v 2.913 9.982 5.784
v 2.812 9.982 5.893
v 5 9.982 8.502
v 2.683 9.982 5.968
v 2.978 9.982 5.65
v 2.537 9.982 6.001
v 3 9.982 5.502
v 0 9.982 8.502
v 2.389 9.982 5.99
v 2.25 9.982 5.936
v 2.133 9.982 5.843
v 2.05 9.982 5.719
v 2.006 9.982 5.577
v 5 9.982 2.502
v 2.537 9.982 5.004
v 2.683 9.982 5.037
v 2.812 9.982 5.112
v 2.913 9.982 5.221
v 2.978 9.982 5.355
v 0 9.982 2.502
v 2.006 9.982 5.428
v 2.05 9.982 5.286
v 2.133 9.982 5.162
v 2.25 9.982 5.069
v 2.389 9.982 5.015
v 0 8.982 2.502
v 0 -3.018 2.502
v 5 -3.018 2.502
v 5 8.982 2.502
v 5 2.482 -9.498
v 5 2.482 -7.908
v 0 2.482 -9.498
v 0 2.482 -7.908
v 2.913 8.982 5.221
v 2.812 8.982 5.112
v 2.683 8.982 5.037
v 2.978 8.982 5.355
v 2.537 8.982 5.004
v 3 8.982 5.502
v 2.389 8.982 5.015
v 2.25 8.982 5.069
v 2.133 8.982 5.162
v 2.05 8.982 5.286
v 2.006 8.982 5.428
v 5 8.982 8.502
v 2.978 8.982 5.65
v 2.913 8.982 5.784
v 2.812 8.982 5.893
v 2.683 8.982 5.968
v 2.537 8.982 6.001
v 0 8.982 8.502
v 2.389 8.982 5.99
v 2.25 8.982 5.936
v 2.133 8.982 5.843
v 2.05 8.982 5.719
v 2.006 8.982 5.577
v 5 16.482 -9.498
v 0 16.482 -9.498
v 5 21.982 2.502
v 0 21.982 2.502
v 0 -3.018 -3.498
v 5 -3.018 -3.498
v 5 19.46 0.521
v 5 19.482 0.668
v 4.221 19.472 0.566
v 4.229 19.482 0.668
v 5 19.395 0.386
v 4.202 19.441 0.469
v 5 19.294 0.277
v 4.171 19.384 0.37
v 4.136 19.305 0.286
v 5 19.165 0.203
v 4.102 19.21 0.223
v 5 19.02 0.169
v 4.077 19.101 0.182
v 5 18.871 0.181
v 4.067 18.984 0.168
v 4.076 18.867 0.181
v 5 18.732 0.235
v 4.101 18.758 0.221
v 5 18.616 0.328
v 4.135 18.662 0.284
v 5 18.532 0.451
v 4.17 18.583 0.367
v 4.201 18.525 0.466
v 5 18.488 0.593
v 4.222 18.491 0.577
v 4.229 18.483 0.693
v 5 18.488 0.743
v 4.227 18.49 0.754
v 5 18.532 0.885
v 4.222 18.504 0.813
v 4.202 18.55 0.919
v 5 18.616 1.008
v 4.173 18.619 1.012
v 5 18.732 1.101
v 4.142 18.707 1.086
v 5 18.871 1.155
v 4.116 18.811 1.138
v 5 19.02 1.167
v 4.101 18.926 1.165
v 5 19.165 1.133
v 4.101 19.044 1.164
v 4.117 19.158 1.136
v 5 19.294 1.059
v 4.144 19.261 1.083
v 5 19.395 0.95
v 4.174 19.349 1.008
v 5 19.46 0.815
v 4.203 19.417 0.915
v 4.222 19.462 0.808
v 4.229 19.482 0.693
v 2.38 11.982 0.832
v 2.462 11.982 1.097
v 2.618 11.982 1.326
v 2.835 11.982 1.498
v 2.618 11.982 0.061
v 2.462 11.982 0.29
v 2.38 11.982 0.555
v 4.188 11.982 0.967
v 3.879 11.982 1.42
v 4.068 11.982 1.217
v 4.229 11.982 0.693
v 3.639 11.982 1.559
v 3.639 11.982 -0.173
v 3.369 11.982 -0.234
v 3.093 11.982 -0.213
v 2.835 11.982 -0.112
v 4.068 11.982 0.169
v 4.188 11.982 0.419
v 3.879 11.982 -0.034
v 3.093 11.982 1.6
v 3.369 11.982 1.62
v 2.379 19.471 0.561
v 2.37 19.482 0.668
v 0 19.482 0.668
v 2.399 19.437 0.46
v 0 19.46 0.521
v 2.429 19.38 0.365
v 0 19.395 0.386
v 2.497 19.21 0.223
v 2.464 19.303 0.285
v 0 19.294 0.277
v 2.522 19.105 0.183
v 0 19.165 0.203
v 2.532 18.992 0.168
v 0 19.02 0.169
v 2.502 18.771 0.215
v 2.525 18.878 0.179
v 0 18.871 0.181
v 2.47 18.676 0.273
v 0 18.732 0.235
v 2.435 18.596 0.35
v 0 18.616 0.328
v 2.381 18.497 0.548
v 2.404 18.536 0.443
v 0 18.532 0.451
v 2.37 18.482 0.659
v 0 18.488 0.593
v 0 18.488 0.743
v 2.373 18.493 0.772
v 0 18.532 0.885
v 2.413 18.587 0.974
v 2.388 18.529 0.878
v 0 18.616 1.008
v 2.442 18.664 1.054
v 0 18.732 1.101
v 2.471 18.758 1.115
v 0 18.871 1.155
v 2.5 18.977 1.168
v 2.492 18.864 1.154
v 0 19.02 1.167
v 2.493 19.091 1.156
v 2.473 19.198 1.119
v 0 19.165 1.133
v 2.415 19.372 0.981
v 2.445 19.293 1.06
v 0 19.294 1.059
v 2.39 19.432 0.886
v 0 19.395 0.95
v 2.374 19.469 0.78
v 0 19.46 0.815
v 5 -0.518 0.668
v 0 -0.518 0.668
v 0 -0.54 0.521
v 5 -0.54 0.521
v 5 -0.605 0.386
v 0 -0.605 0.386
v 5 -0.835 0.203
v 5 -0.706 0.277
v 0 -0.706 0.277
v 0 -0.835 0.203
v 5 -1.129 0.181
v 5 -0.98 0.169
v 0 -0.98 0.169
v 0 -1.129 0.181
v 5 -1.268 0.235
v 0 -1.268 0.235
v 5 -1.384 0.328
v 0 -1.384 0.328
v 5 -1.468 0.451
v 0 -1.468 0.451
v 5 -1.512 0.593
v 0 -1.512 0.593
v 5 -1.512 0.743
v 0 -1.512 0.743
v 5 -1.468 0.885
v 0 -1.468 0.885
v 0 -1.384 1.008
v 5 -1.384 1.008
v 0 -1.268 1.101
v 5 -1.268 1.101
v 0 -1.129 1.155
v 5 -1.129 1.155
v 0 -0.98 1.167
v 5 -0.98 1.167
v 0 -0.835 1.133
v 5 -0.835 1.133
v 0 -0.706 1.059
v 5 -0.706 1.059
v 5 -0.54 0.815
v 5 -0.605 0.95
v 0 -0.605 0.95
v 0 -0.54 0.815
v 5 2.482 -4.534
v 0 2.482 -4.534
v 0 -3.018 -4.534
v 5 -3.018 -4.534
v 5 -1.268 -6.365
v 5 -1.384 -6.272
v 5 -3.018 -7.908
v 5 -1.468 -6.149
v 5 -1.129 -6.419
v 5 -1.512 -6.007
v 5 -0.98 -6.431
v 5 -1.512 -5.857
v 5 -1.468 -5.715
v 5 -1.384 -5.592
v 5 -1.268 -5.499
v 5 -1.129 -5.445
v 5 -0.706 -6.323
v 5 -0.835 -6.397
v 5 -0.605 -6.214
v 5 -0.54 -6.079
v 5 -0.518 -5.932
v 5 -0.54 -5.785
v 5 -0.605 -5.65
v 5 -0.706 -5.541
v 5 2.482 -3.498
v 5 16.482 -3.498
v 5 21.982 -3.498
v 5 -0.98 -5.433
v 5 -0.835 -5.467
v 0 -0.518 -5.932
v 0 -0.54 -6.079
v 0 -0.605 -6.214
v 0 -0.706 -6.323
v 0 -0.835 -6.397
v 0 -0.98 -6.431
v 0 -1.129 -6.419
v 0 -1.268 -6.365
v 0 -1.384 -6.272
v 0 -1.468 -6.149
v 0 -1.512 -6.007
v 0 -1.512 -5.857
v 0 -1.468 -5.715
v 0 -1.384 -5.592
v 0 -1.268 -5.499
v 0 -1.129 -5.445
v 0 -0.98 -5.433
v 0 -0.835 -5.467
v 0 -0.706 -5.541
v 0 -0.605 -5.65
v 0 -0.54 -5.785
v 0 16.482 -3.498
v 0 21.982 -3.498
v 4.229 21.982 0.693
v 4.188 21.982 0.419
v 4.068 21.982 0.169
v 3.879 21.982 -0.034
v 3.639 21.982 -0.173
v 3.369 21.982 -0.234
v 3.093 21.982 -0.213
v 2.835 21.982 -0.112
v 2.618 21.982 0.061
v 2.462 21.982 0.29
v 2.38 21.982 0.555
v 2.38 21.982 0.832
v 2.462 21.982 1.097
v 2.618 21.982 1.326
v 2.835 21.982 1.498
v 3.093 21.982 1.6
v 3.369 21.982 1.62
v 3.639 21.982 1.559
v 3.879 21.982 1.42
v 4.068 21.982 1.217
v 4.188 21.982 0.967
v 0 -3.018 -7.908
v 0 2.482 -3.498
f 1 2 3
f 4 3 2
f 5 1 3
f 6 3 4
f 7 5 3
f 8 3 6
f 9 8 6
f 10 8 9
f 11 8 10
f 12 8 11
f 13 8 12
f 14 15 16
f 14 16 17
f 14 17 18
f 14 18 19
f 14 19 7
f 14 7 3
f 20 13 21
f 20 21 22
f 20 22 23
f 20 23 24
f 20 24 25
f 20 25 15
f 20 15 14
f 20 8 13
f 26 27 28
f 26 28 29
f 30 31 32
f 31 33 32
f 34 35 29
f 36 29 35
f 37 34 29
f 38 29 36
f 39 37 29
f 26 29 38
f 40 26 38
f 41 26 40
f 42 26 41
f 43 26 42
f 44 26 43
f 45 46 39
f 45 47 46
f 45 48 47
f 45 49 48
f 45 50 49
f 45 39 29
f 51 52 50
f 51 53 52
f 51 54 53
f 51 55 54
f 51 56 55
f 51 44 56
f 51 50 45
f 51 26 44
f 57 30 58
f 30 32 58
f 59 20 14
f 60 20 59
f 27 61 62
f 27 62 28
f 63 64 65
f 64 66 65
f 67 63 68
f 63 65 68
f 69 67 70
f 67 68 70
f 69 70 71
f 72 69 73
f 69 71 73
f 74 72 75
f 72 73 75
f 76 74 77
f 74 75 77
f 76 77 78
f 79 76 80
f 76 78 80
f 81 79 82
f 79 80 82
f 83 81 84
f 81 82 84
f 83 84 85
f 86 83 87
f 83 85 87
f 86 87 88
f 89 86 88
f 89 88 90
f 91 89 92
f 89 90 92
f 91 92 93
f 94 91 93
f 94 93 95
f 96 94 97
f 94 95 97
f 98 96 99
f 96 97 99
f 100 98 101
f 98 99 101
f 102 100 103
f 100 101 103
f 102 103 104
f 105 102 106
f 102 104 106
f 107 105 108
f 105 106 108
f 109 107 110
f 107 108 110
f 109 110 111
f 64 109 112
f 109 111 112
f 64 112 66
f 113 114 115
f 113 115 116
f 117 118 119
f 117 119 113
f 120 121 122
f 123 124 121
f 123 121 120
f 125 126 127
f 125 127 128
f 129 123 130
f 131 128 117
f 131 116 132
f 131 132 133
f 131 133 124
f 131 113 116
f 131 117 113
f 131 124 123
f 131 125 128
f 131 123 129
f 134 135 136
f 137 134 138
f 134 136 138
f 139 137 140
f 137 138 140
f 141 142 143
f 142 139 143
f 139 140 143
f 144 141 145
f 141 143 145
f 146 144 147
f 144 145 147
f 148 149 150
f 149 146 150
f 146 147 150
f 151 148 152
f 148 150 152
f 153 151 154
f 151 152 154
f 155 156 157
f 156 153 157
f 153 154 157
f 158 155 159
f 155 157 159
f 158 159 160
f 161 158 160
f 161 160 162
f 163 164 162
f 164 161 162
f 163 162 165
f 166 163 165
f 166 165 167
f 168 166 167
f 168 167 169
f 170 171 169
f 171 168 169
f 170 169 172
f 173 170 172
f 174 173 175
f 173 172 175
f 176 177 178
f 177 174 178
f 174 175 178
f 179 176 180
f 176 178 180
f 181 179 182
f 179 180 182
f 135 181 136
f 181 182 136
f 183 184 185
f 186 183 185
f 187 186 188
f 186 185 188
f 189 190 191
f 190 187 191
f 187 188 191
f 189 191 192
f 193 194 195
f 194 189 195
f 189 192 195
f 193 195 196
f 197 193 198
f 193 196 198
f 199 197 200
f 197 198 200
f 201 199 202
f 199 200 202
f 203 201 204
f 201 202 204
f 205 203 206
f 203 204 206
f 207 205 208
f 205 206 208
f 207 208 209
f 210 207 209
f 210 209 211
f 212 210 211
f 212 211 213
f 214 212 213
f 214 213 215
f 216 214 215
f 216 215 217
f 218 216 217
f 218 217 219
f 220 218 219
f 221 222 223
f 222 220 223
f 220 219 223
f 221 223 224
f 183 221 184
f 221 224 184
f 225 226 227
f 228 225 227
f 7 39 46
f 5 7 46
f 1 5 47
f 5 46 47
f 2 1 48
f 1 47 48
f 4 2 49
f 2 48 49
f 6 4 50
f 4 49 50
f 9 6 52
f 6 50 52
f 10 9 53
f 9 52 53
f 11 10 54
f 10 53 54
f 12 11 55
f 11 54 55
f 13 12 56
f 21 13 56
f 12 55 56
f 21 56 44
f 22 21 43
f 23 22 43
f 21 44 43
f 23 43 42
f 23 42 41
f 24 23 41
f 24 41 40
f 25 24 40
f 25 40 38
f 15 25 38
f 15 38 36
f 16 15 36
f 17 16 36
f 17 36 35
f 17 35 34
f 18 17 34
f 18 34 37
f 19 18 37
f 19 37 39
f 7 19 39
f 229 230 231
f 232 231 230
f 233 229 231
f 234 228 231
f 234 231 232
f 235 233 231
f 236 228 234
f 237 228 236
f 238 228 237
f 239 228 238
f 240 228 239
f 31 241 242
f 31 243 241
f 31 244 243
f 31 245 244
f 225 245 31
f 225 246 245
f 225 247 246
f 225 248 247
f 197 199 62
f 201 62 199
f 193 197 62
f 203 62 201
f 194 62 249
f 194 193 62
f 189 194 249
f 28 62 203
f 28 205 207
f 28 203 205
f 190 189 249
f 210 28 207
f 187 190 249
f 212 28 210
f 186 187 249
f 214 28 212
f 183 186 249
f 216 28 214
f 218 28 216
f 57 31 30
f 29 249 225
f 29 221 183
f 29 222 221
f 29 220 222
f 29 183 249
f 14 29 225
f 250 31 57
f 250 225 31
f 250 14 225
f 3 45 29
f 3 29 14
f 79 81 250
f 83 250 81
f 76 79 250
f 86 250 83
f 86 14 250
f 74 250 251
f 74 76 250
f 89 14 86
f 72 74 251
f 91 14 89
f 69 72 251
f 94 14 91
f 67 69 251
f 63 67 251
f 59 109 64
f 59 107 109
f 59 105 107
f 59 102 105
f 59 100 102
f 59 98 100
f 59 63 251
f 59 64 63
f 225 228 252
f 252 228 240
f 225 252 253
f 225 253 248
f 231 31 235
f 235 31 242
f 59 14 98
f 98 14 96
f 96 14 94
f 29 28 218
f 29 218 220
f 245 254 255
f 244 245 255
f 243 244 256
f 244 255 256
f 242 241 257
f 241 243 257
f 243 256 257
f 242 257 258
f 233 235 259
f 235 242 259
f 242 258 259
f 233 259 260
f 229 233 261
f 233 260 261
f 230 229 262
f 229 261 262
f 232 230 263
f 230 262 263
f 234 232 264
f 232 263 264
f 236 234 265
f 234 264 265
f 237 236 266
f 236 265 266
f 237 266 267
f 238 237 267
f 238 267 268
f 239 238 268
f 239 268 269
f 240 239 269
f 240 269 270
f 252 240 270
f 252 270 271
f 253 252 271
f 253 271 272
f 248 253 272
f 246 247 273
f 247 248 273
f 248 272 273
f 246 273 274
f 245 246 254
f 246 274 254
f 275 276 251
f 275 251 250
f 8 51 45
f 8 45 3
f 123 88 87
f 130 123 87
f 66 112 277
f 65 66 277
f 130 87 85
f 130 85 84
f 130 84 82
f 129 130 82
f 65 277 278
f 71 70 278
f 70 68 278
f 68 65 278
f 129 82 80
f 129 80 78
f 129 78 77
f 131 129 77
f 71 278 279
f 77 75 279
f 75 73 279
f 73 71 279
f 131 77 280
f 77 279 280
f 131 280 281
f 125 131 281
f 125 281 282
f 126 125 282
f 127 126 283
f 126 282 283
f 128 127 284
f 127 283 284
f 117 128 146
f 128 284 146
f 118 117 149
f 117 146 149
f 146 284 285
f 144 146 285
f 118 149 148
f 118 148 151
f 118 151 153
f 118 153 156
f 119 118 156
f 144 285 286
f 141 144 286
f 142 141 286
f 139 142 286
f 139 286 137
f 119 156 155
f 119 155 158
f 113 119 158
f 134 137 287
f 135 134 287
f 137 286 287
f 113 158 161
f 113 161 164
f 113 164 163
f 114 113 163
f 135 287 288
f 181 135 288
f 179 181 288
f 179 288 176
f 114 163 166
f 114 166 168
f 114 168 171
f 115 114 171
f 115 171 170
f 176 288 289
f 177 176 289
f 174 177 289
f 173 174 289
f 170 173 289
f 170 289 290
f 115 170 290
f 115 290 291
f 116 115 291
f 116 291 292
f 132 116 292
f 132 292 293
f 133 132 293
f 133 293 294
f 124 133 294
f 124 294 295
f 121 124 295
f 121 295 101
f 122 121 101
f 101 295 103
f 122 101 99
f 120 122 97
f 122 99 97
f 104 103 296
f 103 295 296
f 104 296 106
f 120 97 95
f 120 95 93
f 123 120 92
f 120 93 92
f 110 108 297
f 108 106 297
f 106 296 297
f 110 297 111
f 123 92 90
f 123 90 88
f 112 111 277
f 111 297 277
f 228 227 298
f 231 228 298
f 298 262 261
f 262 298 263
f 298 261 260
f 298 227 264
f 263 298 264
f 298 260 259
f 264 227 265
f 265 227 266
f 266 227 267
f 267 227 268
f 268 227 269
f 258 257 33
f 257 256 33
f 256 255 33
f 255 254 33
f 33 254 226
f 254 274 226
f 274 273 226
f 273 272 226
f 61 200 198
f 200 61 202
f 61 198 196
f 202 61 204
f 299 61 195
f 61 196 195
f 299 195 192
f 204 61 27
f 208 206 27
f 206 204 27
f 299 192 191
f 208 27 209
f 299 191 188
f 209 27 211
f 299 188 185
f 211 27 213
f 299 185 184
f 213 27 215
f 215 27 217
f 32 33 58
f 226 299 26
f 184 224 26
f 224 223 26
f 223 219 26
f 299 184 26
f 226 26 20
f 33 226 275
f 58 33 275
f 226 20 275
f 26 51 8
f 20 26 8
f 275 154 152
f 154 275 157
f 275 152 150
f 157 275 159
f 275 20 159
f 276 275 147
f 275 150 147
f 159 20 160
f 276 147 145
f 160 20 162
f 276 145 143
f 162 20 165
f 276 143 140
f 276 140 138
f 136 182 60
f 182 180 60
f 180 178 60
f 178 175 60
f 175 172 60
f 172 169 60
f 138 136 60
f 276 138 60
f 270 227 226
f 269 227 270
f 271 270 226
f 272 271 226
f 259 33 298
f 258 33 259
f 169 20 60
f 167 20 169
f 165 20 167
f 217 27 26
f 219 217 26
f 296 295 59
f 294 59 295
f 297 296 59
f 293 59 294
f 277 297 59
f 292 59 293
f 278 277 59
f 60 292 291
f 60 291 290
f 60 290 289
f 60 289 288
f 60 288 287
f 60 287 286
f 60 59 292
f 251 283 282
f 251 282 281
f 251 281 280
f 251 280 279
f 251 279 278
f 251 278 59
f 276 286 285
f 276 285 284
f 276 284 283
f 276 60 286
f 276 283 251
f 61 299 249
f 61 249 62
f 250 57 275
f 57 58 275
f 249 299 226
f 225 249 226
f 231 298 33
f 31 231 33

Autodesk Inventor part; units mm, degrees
ref_plane "YZ Plane" through (0, 0, 0) normal (1, 0, 0) x (0, 1, 0)
ref_plane "XZ Plane" through (0, 0, 0) normal (0, 1, 0) x (-1, 0, 0)
ref_plane "XY Plane" through (0, 0, 0) normal (0, 0, 1) x (1, 0, 0)
sketch "Sketch1" plane through (0, 0, 0) normal (1, 0, 0) x (0, 1, 0)
  line L0 (-3.0178, 2.5025) -> (21.9822, 2.5025)
  line L1 (21.9822, 2.5025) -> (21.9822, -3.4975)
  line L2 (21.9822, -3.4975) -> (-3.0178, -3.4975)
  line L3 (-3.0178, -3.4975) -> (-3.0178, 2.5025)
  circle A0 centre (-1.0178, 0.668) radius 0.5
  circle A1 centre (18.9822, 0.668) radius 0.5
  line L4 (16.4822, -3.4975) -> (2.4822, -3.4975)
  line L5 (2.4822, -3.4975) -> (2.4822, -9.4975)
  line L6 (2.4822, -9.4975) -> (16.4822, -9.4975)
  line L7 (9.9822, 2.5025) -> (8.9822, 2.5025)
  line L8 (8.9822, 2.5025) -> (8.9822, 8.5025)
  line L9 (8.9822, 8.5025) -> (9.9822, 8.5025)
  line L10 (9.9822, 8.5025) -> (9.9822, 2.5025)
  line L11 (16.4822, -9.4975) -> (16.4822, -3.4975)
  circle A2 centre (-1.0178, -5.932) radius 0.5
  line L12 (2.4822, -4.5336) -> (-3.0178, -4.5336)
  line L13 (-3.0178, -4.5336) -> (-3.0178, -7.908)
  line L14 (-3.0178, -7.908) -> (2.4822, -7.908)
  line L15 (2.4822, -7.908) -> (2.4822, -4.5336)
  point P0 (0, 0)
  dimension "d0" = 25
  dimension "d1" = 6
  dimension "d2" = 1
  dimension "d3" = 1
  dimension "d4" = 20
  dimension "d5" = 14
  dimension "d6" = 6
  dimension "d8" = 1
  dimension "d9" = 6
  dimension "d10" = 10
  dimension "d13" = 2
  dimension "d18" = 3
  dimension "d19" = 5.5
  dimension "d20" = 1
  dimension "d21" = 6.6
extrude "Extrusion1" add sketch "Sketch1" along normal blind 5
sketch "Sketch2" plane through (0, 8.9822, 2.5025) normal (0, -1, 0) x (1, 0, 0)
  line L0 (0, 6) -> (0, 0) projected
  line L1 (0, 0) -> (5, 0) projected
  line L2 (5, 6) -> (5, 0) projected
  line L3 (0, 6) -> (5, 6) projected
  circle A0 centre (2.5, 3) radius 0.5
  point P0 (0, -2.5025)
  dimension "d14" = 1
extrude "Extrusion2" cut sketch "Sketch2" against normal blind 5 contours A0
sketch "Skizze3" plane through (0, 21.9822, 2.5025) normal (0, 1, 0) x (1, 0, 0)
  line L0 (0, 0) -> (0, 6) projected
  line L1 (0, 0) -> (5, 0) projected
  line L2 (5, 6) -> (5, 0) projected
  line L3 (0, 6) -> (5, 6) projected
  line L4 (0, 2.3346) -> (5, 2.3346) projected
  line L5 (0, 1.3346) -> (5, 1.3346) projected
  circle A0 centre (3.2995, 1.8094) radius 0.9299
  point P0 (0, 2.5025)
extrude "Extrusion3" cut sketch "Skizze3" against normal blind 10 contours A0 L4 L5 | L5 A0 | A0 L4
properties part number "00_Microlinearmotor"
